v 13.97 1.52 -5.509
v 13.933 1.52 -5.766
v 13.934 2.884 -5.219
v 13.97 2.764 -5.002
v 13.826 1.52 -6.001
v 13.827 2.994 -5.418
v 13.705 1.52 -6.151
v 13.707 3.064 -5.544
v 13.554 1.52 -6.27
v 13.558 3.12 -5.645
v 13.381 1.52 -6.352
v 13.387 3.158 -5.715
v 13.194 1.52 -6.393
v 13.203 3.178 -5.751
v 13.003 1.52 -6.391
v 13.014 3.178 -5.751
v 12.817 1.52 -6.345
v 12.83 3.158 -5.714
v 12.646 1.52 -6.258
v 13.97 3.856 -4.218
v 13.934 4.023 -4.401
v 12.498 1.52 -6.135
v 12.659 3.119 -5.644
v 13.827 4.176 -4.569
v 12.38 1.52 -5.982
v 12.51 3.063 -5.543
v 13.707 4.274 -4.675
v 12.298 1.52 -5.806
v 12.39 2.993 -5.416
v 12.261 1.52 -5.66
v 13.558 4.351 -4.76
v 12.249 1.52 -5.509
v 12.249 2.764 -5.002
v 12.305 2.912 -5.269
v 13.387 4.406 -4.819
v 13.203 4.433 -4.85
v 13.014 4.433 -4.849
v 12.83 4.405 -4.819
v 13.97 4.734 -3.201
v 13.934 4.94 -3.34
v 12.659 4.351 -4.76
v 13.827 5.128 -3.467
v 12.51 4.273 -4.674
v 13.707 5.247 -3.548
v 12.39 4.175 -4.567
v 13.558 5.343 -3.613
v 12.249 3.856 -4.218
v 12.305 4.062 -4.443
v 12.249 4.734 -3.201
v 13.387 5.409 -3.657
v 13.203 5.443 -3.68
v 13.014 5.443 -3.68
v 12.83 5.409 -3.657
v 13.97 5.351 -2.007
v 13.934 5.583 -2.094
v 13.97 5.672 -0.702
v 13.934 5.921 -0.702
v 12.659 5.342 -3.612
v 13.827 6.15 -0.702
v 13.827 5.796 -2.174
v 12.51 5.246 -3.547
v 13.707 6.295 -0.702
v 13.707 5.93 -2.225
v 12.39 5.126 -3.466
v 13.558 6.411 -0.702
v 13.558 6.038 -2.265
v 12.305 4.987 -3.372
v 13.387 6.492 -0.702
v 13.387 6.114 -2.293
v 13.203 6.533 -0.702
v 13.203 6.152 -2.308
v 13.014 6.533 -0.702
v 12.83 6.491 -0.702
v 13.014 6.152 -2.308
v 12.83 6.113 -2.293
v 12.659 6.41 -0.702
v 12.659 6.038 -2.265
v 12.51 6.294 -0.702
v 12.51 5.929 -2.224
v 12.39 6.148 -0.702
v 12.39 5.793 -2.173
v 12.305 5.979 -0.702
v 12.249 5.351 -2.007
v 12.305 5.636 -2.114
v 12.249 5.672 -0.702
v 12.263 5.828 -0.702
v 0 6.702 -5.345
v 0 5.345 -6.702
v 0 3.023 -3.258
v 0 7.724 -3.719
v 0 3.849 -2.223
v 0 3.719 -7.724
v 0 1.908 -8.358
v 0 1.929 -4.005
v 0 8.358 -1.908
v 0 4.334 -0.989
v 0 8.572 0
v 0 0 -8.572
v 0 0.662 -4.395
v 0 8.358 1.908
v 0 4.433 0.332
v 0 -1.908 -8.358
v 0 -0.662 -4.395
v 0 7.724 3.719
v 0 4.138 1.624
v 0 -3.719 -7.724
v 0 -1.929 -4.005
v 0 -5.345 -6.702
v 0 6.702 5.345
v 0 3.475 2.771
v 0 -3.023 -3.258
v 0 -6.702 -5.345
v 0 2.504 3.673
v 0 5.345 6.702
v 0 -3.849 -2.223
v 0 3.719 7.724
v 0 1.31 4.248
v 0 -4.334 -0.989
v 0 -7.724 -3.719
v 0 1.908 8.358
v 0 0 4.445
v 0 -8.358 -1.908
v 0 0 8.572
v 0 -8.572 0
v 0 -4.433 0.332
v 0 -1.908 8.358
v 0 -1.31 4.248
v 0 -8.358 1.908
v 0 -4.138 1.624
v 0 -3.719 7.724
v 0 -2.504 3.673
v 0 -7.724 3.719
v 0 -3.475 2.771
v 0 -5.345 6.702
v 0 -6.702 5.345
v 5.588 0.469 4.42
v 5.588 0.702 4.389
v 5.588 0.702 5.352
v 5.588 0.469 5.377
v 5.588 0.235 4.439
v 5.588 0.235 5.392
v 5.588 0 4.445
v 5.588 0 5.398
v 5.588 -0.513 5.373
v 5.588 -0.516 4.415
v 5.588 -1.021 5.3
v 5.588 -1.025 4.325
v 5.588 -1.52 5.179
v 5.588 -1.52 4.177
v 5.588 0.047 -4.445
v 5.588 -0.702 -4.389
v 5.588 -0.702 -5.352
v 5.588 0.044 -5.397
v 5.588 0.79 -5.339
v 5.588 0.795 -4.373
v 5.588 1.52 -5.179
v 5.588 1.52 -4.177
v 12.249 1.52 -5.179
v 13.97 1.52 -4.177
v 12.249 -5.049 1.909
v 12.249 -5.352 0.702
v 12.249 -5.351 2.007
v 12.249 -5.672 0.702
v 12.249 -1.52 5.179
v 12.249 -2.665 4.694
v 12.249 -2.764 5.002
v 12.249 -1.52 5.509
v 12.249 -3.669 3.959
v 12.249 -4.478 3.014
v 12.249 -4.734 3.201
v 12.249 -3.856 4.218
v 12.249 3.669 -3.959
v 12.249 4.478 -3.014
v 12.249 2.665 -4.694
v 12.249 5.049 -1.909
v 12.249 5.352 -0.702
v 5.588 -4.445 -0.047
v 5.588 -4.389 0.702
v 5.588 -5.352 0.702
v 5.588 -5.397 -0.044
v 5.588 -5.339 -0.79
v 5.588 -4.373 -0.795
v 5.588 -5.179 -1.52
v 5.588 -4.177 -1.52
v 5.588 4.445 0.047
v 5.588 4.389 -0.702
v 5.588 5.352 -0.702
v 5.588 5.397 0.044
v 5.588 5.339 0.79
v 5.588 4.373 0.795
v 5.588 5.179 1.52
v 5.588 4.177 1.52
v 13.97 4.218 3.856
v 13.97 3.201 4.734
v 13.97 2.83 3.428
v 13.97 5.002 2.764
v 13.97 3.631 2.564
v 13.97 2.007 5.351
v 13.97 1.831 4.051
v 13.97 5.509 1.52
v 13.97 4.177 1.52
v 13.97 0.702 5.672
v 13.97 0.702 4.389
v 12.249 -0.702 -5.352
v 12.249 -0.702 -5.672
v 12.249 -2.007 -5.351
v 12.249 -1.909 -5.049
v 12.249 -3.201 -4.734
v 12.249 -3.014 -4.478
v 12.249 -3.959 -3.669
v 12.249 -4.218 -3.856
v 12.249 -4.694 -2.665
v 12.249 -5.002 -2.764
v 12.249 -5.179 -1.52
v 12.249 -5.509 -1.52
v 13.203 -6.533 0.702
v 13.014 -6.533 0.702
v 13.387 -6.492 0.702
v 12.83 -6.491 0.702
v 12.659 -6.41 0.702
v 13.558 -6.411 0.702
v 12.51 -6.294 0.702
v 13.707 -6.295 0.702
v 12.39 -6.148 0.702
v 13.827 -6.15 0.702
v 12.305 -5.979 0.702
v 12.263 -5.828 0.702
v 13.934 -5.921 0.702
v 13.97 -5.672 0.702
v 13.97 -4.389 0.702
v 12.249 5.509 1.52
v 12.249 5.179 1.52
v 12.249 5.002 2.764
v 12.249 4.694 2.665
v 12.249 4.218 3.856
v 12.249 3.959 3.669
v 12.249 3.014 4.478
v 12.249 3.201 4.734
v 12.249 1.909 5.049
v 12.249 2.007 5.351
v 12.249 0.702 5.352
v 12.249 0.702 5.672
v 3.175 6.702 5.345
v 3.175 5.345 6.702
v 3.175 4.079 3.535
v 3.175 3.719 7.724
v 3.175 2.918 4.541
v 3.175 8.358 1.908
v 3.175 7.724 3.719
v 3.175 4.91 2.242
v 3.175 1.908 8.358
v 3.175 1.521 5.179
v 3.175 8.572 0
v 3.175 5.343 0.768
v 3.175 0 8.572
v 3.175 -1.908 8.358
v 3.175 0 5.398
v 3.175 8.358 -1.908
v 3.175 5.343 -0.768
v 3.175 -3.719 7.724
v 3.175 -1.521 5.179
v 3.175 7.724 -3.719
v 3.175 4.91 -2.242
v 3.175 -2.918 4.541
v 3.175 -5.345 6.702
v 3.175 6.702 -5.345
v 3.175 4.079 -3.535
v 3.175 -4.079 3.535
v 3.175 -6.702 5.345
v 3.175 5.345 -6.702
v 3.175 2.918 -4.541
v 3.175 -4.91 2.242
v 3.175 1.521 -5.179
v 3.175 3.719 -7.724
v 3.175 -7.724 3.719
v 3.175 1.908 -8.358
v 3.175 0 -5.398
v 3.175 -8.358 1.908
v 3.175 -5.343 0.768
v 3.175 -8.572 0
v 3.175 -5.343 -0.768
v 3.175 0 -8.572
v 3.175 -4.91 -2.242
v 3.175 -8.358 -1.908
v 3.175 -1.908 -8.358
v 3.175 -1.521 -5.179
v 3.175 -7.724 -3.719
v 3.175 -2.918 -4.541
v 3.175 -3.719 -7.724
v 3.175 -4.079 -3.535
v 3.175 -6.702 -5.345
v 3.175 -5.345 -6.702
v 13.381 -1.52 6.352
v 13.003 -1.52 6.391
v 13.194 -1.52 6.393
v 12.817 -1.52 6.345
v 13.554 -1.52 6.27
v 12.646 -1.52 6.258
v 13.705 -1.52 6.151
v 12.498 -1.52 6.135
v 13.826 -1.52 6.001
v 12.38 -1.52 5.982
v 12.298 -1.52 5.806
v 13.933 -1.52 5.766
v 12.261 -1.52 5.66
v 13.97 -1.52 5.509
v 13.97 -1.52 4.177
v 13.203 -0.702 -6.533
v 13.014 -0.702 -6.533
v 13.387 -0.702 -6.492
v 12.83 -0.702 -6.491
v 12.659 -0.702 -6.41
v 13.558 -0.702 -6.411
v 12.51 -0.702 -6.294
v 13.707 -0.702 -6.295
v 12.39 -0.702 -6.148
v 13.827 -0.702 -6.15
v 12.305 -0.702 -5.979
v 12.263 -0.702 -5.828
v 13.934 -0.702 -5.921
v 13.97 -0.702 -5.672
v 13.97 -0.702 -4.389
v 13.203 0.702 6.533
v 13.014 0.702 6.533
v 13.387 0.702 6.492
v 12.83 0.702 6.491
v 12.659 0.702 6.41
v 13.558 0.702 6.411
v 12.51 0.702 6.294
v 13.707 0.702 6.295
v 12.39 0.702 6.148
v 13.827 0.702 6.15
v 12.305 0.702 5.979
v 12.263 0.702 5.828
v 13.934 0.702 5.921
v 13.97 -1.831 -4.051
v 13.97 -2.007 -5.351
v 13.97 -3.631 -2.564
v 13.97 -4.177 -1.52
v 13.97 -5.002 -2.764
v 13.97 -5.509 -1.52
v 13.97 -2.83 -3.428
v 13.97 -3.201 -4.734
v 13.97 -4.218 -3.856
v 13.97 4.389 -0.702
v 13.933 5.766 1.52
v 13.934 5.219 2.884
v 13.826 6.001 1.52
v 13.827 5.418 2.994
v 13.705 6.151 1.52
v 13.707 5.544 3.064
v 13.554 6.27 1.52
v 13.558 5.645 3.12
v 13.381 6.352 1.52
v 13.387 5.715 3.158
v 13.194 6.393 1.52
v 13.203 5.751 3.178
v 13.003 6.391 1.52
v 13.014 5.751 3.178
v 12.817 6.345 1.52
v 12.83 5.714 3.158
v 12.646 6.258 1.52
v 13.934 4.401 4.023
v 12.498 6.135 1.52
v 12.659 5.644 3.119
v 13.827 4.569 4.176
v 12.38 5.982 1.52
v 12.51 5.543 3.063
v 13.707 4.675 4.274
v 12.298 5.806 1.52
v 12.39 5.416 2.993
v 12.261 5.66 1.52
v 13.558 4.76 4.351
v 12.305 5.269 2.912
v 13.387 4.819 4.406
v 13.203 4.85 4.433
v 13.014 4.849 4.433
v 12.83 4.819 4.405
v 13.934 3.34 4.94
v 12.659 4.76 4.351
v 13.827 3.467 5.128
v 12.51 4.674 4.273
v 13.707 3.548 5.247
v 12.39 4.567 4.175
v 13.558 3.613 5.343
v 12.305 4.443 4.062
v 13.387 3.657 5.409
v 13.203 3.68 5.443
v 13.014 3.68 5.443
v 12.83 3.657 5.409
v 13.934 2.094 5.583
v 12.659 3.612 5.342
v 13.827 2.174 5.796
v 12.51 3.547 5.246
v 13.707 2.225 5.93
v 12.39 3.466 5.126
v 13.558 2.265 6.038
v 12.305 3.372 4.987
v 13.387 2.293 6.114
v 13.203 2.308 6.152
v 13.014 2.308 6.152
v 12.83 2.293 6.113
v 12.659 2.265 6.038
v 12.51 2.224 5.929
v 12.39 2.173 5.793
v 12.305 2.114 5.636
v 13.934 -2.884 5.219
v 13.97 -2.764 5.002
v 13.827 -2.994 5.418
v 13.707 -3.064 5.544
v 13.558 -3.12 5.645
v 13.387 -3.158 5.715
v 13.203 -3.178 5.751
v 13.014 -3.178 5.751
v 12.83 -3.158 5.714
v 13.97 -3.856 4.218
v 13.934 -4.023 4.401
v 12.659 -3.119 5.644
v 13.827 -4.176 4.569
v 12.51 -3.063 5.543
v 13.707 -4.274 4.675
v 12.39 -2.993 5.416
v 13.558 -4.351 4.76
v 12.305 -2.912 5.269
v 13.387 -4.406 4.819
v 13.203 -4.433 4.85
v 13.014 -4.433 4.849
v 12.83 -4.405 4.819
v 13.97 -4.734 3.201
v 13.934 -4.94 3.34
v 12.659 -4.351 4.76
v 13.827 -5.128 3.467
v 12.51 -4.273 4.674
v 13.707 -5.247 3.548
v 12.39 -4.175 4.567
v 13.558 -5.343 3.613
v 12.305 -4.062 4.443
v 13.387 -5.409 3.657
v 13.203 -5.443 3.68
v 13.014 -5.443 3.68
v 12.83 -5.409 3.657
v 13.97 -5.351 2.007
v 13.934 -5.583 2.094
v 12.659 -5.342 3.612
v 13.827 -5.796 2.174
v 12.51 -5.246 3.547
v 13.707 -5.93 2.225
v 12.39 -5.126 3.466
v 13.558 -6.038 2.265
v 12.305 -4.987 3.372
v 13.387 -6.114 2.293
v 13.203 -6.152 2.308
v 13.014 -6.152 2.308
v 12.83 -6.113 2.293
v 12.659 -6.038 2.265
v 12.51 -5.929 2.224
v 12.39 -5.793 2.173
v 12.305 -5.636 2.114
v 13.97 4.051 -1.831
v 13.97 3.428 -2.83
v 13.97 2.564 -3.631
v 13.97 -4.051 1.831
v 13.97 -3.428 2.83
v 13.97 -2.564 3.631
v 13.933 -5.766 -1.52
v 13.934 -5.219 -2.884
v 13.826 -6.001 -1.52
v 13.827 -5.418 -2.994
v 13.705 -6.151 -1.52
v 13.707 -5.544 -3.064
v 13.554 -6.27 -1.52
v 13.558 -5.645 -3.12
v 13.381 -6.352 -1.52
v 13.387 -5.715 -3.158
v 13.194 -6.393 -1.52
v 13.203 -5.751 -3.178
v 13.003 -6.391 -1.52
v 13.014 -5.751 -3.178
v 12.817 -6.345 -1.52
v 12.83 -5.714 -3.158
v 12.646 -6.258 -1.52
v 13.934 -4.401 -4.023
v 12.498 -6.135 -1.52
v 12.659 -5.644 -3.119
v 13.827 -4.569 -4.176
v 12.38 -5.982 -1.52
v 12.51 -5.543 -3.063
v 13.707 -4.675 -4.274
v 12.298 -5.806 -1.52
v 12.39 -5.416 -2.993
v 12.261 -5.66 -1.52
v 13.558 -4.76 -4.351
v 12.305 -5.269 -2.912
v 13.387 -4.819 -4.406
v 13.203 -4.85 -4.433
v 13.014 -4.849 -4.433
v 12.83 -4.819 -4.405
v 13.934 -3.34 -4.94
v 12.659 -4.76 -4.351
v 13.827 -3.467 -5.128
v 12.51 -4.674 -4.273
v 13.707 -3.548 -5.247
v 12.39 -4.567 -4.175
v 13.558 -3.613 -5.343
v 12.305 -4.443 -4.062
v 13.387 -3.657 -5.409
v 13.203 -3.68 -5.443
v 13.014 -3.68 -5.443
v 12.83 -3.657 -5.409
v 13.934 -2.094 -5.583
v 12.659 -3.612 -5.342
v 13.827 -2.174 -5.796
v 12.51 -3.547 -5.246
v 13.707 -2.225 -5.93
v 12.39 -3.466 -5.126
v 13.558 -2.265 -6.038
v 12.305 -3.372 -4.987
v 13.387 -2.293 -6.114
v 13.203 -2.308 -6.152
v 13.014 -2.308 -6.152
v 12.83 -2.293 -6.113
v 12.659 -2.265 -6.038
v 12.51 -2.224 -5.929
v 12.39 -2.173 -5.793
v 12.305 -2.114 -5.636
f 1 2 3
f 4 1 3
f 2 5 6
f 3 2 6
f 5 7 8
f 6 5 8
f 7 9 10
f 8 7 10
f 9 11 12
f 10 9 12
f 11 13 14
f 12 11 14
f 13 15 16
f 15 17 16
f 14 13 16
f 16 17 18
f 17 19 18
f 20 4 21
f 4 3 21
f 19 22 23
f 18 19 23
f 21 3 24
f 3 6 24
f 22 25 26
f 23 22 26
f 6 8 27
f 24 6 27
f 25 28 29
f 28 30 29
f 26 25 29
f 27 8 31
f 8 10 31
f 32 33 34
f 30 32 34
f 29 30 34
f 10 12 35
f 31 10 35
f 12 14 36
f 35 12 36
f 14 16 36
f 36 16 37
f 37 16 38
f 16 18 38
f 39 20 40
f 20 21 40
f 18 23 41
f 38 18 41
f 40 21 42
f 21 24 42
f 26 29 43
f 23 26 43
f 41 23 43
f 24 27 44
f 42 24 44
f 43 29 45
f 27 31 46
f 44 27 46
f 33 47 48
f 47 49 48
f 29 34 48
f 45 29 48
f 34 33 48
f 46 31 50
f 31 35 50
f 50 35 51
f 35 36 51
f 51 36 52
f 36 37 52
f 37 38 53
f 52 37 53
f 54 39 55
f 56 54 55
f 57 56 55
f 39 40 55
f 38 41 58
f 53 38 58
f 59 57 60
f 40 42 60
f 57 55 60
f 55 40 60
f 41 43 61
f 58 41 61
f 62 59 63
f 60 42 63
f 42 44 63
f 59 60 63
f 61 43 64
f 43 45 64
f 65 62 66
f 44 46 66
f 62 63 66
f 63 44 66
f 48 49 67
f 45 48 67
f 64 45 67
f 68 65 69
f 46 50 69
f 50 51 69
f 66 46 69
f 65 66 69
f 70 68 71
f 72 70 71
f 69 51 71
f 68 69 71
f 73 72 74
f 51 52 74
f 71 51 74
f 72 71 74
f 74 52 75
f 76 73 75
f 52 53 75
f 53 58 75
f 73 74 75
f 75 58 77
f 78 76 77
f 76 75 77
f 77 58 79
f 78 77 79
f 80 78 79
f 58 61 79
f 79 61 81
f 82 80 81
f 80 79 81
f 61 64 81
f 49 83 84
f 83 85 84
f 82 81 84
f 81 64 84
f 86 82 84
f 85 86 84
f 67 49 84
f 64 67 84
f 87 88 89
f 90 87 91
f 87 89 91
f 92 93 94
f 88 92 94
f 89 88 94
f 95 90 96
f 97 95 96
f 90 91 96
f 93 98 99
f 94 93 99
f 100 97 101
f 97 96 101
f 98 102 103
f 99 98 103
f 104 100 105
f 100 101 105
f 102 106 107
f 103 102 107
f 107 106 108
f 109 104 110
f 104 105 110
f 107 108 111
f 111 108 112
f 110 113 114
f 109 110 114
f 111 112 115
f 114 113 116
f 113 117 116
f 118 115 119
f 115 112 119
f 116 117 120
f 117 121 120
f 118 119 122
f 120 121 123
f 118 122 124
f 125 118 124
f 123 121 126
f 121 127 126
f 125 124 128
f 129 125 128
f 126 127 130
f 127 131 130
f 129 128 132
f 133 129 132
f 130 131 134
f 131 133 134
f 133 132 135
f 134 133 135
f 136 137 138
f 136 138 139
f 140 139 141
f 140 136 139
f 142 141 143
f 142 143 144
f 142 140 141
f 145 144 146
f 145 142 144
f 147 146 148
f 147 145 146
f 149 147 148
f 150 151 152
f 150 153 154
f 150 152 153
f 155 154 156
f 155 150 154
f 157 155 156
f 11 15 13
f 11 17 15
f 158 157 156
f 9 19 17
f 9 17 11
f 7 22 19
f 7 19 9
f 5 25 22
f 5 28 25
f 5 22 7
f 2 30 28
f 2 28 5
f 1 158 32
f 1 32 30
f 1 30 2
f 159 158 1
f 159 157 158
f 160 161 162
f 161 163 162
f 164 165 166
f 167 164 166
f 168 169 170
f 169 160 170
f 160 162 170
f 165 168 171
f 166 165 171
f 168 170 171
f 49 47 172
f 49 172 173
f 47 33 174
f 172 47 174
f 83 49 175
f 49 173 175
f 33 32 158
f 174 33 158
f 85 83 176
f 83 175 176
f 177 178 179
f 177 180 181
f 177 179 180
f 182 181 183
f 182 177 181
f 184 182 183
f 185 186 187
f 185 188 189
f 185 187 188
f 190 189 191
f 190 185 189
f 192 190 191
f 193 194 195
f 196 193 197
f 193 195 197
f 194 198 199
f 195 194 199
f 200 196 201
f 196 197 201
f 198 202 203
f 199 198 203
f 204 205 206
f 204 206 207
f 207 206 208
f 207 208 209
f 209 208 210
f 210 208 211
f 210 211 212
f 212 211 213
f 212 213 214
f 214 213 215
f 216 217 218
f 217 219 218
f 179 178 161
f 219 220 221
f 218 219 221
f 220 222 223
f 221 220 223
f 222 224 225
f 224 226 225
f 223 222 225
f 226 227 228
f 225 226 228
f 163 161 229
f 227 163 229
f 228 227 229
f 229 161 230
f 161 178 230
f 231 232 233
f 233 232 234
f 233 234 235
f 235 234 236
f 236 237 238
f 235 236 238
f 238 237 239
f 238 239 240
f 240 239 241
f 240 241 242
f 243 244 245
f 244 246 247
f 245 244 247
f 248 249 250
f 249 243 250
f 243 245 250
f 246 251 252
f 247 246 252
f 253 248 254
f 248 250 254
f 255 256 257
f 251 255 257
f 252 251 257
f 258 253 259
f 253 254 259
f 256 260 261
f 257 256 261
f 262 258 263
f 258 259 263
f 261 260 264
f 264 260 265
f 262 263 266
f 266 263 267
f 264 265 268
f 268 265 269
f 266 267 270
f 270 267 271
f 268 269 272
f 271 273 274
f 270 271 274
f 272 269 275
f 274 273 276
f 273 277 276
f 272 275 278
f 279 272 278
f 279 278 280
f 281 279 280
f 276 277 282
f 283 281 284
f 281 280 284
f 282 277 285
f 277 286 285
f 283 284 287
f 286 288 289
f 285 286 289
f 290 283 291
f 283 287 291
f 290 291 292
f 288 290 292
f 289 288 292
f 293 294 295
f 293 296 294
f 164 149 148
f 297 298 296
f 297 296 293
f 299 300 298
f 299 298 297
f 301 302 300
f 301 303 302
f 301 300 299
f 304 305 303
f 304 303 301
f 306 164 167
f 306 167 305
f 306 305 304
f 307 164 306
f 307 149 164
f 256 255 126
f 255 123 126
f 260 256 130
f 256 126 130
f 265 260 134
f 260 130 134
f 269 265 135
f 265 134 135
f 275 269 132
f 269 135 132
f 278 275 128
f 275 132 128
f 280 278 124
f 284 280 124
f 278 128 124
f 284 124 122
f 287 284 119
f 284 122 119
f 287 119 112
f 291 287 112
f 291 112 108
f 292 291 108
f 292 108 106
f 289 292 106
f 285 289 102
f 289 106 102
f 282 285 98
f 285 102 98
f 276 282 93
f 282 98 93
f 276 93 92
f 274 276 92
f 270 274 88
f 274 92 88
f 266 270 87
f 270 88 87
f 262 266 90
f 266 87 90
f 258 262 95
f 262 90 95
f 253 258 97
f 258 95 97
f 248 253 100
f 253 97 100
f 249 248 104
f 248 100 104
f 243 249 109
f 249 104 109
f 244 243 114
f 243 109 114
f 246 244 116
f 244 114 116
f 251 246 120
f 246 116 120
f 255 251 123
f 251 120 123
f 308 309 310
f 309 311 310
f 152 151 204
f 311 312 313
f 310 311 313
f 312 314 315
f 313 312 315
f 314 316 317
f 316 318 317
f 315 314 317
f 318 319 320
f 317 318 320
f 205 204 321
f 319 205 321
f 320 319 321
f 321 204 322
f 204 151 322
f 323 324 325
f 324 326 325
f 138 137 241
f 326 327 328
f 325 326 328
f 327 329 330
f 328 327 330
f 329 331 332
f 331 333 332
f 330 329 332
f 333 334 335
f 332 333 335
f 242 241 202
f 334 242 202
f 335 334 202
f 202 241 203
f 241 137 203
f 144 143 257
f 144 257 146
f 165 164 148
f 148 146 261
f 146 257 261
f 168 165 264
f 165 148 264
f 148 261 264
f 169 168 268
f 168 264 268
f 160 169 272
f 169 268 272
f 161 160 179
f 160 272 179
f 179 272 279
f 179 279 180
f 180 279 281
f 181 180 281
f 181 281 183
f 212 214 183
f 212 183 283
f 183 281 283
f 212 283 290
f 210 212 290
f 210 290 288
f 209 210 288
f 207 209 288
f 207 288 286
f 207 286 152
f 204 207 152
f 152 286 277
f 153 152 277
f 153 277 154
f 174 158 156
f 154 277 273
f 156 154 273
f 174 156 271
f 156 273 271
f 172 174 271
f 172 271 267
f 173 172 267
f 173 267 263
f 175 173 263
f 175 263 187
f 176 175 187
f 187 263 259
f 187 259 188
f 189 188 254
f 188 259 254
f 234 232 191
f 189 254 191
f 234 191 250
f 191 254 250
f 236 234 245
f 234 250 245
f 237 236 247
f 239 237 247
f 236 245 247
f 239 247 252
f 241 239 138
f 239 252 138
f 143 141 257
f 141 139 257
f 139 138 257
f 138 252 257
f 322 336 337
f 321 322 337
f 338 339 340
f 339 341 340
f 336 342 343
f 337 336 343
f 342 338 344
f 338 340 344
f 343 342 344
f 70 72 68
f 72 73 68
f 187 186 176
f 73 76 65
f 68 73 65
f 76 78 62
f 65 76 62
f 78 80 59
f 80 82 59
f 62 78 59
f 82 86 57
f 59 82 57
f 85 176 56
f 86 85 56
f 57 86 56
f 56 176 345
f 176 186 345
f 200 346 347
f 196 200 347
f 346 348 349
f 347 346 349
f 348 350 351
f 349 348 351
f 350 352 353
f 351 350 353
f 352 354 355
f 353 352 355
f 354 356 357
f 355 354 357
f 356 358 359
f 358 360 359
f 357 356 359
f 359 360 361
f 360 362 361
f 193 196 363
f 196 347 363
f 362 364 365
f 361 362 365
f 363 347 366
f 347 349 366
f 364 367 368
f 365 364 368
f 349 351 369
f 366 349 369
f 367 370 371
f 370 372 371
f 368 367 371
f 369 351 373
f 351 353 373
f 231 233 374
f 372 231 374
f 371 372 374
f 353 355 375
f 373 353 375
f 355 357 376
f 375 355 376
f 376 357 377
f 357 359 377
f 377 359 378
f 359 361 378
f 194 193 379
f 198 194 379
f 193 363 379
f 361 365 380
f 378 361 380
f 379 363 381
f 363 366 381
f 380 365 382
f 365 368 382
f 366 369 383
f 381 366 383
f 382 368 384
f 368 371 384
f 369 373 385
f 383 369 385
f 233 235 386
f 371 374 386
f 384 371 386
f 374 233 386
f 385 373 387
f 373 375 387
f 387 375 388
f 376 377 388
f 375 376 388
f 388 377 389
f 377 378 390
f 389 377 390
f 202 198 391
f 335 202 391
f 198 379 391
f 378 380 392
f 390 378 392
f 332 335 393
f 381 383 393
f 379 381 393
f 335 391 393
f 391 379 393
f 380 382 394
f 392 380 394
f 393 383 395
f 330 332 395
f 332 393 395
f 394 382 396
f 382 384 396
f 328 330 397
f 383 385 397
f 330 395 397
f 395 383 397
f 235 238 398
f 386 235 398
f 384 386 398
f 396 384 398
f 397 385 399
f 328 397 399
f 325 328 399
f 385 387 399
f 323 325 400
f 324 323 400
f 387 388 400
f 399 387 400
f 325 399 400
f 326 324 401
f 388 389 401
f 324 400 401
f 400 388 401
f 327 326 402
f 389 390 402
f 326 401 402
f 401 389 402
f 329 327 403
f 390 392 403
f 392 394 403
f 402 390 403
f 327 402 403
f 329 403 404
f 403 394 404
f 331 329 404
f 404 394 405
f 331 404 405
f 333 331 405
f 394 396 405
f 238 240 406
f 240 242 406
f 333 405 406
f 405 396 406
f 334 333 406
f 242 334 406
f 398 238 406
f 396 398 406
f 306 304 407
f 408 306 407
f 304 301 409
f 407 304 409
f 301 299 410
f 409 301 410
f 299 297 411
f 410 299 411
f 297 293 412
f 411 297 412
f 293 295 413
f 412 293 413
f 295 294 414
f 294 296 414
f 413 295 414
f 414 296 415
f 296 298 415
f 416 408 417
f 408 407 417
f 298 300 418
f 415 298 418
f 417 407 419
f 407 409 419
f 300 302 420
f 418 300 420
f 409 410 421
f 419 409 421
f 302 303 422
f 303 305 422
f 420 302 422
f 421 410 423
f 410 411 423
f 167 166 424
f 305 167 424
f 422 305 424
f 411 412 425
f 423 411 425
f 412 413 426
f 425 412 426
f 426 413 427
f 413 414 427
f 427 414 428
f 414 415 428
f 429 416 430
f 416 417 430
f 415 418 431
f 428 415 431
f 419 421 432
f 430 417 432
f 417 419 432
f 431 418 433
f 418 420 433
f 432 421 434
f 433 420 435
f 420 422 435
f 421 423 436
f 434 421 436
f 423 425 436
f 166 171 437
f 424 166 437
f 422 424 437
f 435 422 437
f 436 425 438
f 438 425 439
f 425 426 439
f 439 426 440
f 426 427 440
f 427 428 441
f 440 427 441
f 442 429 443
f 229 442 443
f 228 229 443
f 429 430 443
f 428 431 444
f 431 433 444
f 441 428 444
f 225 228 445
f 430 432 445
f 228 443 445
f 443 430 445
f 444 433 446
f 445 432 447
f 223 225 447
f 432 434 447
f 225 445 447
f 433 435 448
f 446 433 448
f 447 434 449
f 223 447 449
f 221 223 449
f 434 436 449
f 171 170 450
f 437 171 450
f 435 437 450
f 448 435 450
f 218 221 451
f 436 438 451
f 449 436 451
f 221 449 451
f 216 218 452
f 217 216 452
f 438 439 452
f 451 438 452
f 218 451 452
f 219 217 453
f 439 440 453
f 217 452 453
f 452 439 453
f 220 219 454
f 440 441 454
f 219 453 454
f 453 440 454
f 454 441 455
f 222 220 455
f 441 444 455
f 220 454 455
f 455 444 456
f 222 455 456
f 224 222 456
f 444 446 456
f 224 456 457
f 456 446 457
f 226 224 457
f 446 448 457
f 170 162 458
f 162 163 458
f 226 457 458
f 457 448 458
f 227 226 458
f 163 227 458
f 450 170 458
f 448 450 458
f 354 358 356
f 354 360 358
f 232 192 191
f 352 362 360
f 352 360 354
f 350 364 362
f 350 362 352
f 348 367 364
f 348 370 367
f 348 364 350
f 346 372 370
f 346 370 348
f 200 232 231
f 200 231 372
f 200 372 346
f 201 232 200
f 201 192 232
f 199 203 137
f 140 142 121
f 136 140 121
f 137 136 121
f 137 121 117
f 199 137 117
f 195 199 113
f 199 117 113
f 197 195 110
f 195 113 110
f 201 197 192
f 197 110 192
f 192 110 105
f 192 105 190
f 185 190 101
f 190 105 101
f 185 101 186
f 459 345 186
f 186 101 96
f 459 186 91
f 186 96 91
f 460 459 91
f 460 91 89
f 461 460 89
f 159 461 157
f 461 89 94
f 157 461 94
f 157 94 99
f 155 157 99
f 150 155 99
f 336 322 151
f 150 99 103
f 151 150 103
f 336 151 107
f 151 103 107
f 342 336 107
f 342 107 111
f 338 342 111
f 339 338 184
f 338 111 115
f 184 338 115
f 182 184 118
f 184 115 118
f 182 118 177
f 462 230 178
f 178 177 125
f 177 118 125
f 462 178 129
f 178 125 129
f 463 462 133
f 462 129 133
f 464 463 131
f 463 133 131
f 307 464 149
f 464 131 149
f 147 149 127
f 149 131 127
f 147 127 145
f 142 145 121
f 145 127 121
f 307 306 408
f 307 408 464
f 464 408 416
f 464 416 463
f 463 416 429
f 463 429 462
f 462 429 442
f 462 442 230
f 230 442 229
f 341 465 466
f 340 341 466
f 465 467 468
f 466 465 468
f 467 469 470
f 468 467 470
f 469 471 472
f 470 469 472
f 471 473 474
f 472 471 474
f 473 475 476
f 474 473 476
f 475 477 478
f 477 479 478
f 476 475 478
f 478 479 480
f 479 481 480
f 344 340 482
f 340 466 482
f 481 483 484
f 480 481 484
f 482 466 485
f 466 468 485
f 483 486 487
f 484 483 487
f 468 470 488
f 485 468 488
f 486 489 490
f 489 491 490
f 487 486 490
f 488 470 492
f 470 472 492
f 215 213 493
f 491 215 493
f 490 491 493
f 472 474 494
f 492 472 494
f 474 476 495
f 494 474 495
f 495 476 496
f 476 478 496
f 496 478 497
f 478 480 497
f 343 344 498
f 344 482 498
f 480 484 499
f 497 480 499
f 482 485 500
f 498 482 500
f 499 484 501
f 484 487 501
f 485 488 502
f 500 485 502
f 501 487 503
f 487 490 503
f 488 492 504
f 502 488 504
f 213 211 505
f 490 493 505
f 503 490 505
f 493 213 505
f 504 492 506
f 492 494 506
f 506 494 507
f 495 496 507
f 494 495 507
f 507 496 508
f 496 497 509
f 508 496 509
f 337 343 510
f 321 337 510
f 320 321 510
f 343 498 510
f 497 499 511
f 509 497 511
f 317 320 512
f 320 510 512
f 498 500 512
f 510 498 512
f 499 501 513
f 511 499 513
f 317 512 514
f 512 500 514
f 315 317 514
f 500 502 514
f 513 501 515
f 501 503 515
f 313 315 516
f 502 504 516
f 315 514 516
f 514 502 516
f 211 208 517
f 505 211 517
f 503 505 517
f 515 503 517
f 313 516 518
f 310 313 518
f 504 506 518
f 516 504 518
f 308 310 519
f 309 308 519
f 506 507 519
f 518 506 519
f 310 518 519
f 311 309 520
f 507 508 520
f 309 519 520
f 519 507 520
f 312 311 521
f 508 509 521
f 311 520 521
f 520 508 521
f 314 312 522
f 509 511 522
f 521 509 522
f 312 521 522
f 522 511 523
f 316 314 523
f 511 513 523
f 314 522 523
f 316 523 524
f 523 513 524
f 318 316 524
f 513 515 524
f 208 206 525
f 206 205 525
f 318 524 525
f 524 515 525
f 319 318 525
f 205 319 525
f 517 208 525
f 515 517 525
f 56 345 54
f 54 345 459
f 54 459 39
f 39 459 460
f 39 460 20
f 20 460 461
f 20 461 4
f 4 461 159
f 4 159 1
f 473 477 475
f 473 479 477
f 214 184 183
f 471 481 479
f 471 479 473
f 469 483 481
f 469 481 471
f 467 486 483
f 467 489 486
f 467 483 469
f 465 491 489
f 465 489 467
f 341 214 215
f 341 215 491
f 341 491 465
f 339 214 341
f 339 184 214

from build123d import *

# Parameters (mm, degrees)
SKETCH2_R          = 4.445
CUT_EXTRUDE1_DEPTH = 18.034
SKETCH5_W          = 8.382
SKETCH5_H          = 2.2225
CUT_EXTRUDE2_DEPTH = 19.496929813
CIRPATTERN1_COUNT  = 4


with BuildPart() as part:
    # Sketch1 → Revolve1 (revolve)
    with BuildSketch(Plane.XY, mode=Mode.PRIVATE) as revolve1_sk:
        with BuildLine():
            Line((0, 0), (13.97, 0))
            Line((13.97, 0), (13.97, 5.715))
            ThreePointArc((13.97, 5.715), (13.109377289, 6.575622711), (12.248754579, 5.715))
            Line((12.248754579, 5.715), (12.248754579, 5.3975))
            Line((12.248754579, 5.3975), (3.175, 5.3975))
            Line((3.175, 5.3975), (3.175, 8.5725))
            Line((3.175, 8.5725), (0, 8.5725))
            Line((0, 8.5725), (0, 0))
        make_face()
    revolve(revolve1_sk.sketch.rotate(Axis((0, 0, 0), (1, 0, 0)), 90), axis=Axis((0, 0, 0), (1, 0, 0)))

    # Sketch2 → Cut-Extrude1 (cut)
    with BuildSketch(Plane.ZY):
        Circle(SKETCH2_R)
    extrude(amount=-CUT_EXTRUDE1_DEPTH, mode=Mode.SUBTRACT)

    # Sketch5 → Cut-Extrude2 (cut, through all)
    with BuildSketch(Plane.XY):
        with Locations((9.779, 0.408848188)):
            Rectangle(SKETCH5_W, SKETCH5_H)
    cut_extrude2 = extrude(amount=-CUT_EXTRUDE2_DEPTH, mode=Mode.SUBTRACT)

    # CirPattern1: Cut-Extrude2 ×4 about axis
    cirpattern1_axis = Axis((0, 0, 0), (1, 0, 0))
    for i in range(1, CIRPATTERN1_COUNT):
        add(cut_extrude2.rotate(cirpattern1_axis, i * 360 / CIRPATTERN1_COUNT), mode=Mode.SUBTRACT)


solid = part.part
